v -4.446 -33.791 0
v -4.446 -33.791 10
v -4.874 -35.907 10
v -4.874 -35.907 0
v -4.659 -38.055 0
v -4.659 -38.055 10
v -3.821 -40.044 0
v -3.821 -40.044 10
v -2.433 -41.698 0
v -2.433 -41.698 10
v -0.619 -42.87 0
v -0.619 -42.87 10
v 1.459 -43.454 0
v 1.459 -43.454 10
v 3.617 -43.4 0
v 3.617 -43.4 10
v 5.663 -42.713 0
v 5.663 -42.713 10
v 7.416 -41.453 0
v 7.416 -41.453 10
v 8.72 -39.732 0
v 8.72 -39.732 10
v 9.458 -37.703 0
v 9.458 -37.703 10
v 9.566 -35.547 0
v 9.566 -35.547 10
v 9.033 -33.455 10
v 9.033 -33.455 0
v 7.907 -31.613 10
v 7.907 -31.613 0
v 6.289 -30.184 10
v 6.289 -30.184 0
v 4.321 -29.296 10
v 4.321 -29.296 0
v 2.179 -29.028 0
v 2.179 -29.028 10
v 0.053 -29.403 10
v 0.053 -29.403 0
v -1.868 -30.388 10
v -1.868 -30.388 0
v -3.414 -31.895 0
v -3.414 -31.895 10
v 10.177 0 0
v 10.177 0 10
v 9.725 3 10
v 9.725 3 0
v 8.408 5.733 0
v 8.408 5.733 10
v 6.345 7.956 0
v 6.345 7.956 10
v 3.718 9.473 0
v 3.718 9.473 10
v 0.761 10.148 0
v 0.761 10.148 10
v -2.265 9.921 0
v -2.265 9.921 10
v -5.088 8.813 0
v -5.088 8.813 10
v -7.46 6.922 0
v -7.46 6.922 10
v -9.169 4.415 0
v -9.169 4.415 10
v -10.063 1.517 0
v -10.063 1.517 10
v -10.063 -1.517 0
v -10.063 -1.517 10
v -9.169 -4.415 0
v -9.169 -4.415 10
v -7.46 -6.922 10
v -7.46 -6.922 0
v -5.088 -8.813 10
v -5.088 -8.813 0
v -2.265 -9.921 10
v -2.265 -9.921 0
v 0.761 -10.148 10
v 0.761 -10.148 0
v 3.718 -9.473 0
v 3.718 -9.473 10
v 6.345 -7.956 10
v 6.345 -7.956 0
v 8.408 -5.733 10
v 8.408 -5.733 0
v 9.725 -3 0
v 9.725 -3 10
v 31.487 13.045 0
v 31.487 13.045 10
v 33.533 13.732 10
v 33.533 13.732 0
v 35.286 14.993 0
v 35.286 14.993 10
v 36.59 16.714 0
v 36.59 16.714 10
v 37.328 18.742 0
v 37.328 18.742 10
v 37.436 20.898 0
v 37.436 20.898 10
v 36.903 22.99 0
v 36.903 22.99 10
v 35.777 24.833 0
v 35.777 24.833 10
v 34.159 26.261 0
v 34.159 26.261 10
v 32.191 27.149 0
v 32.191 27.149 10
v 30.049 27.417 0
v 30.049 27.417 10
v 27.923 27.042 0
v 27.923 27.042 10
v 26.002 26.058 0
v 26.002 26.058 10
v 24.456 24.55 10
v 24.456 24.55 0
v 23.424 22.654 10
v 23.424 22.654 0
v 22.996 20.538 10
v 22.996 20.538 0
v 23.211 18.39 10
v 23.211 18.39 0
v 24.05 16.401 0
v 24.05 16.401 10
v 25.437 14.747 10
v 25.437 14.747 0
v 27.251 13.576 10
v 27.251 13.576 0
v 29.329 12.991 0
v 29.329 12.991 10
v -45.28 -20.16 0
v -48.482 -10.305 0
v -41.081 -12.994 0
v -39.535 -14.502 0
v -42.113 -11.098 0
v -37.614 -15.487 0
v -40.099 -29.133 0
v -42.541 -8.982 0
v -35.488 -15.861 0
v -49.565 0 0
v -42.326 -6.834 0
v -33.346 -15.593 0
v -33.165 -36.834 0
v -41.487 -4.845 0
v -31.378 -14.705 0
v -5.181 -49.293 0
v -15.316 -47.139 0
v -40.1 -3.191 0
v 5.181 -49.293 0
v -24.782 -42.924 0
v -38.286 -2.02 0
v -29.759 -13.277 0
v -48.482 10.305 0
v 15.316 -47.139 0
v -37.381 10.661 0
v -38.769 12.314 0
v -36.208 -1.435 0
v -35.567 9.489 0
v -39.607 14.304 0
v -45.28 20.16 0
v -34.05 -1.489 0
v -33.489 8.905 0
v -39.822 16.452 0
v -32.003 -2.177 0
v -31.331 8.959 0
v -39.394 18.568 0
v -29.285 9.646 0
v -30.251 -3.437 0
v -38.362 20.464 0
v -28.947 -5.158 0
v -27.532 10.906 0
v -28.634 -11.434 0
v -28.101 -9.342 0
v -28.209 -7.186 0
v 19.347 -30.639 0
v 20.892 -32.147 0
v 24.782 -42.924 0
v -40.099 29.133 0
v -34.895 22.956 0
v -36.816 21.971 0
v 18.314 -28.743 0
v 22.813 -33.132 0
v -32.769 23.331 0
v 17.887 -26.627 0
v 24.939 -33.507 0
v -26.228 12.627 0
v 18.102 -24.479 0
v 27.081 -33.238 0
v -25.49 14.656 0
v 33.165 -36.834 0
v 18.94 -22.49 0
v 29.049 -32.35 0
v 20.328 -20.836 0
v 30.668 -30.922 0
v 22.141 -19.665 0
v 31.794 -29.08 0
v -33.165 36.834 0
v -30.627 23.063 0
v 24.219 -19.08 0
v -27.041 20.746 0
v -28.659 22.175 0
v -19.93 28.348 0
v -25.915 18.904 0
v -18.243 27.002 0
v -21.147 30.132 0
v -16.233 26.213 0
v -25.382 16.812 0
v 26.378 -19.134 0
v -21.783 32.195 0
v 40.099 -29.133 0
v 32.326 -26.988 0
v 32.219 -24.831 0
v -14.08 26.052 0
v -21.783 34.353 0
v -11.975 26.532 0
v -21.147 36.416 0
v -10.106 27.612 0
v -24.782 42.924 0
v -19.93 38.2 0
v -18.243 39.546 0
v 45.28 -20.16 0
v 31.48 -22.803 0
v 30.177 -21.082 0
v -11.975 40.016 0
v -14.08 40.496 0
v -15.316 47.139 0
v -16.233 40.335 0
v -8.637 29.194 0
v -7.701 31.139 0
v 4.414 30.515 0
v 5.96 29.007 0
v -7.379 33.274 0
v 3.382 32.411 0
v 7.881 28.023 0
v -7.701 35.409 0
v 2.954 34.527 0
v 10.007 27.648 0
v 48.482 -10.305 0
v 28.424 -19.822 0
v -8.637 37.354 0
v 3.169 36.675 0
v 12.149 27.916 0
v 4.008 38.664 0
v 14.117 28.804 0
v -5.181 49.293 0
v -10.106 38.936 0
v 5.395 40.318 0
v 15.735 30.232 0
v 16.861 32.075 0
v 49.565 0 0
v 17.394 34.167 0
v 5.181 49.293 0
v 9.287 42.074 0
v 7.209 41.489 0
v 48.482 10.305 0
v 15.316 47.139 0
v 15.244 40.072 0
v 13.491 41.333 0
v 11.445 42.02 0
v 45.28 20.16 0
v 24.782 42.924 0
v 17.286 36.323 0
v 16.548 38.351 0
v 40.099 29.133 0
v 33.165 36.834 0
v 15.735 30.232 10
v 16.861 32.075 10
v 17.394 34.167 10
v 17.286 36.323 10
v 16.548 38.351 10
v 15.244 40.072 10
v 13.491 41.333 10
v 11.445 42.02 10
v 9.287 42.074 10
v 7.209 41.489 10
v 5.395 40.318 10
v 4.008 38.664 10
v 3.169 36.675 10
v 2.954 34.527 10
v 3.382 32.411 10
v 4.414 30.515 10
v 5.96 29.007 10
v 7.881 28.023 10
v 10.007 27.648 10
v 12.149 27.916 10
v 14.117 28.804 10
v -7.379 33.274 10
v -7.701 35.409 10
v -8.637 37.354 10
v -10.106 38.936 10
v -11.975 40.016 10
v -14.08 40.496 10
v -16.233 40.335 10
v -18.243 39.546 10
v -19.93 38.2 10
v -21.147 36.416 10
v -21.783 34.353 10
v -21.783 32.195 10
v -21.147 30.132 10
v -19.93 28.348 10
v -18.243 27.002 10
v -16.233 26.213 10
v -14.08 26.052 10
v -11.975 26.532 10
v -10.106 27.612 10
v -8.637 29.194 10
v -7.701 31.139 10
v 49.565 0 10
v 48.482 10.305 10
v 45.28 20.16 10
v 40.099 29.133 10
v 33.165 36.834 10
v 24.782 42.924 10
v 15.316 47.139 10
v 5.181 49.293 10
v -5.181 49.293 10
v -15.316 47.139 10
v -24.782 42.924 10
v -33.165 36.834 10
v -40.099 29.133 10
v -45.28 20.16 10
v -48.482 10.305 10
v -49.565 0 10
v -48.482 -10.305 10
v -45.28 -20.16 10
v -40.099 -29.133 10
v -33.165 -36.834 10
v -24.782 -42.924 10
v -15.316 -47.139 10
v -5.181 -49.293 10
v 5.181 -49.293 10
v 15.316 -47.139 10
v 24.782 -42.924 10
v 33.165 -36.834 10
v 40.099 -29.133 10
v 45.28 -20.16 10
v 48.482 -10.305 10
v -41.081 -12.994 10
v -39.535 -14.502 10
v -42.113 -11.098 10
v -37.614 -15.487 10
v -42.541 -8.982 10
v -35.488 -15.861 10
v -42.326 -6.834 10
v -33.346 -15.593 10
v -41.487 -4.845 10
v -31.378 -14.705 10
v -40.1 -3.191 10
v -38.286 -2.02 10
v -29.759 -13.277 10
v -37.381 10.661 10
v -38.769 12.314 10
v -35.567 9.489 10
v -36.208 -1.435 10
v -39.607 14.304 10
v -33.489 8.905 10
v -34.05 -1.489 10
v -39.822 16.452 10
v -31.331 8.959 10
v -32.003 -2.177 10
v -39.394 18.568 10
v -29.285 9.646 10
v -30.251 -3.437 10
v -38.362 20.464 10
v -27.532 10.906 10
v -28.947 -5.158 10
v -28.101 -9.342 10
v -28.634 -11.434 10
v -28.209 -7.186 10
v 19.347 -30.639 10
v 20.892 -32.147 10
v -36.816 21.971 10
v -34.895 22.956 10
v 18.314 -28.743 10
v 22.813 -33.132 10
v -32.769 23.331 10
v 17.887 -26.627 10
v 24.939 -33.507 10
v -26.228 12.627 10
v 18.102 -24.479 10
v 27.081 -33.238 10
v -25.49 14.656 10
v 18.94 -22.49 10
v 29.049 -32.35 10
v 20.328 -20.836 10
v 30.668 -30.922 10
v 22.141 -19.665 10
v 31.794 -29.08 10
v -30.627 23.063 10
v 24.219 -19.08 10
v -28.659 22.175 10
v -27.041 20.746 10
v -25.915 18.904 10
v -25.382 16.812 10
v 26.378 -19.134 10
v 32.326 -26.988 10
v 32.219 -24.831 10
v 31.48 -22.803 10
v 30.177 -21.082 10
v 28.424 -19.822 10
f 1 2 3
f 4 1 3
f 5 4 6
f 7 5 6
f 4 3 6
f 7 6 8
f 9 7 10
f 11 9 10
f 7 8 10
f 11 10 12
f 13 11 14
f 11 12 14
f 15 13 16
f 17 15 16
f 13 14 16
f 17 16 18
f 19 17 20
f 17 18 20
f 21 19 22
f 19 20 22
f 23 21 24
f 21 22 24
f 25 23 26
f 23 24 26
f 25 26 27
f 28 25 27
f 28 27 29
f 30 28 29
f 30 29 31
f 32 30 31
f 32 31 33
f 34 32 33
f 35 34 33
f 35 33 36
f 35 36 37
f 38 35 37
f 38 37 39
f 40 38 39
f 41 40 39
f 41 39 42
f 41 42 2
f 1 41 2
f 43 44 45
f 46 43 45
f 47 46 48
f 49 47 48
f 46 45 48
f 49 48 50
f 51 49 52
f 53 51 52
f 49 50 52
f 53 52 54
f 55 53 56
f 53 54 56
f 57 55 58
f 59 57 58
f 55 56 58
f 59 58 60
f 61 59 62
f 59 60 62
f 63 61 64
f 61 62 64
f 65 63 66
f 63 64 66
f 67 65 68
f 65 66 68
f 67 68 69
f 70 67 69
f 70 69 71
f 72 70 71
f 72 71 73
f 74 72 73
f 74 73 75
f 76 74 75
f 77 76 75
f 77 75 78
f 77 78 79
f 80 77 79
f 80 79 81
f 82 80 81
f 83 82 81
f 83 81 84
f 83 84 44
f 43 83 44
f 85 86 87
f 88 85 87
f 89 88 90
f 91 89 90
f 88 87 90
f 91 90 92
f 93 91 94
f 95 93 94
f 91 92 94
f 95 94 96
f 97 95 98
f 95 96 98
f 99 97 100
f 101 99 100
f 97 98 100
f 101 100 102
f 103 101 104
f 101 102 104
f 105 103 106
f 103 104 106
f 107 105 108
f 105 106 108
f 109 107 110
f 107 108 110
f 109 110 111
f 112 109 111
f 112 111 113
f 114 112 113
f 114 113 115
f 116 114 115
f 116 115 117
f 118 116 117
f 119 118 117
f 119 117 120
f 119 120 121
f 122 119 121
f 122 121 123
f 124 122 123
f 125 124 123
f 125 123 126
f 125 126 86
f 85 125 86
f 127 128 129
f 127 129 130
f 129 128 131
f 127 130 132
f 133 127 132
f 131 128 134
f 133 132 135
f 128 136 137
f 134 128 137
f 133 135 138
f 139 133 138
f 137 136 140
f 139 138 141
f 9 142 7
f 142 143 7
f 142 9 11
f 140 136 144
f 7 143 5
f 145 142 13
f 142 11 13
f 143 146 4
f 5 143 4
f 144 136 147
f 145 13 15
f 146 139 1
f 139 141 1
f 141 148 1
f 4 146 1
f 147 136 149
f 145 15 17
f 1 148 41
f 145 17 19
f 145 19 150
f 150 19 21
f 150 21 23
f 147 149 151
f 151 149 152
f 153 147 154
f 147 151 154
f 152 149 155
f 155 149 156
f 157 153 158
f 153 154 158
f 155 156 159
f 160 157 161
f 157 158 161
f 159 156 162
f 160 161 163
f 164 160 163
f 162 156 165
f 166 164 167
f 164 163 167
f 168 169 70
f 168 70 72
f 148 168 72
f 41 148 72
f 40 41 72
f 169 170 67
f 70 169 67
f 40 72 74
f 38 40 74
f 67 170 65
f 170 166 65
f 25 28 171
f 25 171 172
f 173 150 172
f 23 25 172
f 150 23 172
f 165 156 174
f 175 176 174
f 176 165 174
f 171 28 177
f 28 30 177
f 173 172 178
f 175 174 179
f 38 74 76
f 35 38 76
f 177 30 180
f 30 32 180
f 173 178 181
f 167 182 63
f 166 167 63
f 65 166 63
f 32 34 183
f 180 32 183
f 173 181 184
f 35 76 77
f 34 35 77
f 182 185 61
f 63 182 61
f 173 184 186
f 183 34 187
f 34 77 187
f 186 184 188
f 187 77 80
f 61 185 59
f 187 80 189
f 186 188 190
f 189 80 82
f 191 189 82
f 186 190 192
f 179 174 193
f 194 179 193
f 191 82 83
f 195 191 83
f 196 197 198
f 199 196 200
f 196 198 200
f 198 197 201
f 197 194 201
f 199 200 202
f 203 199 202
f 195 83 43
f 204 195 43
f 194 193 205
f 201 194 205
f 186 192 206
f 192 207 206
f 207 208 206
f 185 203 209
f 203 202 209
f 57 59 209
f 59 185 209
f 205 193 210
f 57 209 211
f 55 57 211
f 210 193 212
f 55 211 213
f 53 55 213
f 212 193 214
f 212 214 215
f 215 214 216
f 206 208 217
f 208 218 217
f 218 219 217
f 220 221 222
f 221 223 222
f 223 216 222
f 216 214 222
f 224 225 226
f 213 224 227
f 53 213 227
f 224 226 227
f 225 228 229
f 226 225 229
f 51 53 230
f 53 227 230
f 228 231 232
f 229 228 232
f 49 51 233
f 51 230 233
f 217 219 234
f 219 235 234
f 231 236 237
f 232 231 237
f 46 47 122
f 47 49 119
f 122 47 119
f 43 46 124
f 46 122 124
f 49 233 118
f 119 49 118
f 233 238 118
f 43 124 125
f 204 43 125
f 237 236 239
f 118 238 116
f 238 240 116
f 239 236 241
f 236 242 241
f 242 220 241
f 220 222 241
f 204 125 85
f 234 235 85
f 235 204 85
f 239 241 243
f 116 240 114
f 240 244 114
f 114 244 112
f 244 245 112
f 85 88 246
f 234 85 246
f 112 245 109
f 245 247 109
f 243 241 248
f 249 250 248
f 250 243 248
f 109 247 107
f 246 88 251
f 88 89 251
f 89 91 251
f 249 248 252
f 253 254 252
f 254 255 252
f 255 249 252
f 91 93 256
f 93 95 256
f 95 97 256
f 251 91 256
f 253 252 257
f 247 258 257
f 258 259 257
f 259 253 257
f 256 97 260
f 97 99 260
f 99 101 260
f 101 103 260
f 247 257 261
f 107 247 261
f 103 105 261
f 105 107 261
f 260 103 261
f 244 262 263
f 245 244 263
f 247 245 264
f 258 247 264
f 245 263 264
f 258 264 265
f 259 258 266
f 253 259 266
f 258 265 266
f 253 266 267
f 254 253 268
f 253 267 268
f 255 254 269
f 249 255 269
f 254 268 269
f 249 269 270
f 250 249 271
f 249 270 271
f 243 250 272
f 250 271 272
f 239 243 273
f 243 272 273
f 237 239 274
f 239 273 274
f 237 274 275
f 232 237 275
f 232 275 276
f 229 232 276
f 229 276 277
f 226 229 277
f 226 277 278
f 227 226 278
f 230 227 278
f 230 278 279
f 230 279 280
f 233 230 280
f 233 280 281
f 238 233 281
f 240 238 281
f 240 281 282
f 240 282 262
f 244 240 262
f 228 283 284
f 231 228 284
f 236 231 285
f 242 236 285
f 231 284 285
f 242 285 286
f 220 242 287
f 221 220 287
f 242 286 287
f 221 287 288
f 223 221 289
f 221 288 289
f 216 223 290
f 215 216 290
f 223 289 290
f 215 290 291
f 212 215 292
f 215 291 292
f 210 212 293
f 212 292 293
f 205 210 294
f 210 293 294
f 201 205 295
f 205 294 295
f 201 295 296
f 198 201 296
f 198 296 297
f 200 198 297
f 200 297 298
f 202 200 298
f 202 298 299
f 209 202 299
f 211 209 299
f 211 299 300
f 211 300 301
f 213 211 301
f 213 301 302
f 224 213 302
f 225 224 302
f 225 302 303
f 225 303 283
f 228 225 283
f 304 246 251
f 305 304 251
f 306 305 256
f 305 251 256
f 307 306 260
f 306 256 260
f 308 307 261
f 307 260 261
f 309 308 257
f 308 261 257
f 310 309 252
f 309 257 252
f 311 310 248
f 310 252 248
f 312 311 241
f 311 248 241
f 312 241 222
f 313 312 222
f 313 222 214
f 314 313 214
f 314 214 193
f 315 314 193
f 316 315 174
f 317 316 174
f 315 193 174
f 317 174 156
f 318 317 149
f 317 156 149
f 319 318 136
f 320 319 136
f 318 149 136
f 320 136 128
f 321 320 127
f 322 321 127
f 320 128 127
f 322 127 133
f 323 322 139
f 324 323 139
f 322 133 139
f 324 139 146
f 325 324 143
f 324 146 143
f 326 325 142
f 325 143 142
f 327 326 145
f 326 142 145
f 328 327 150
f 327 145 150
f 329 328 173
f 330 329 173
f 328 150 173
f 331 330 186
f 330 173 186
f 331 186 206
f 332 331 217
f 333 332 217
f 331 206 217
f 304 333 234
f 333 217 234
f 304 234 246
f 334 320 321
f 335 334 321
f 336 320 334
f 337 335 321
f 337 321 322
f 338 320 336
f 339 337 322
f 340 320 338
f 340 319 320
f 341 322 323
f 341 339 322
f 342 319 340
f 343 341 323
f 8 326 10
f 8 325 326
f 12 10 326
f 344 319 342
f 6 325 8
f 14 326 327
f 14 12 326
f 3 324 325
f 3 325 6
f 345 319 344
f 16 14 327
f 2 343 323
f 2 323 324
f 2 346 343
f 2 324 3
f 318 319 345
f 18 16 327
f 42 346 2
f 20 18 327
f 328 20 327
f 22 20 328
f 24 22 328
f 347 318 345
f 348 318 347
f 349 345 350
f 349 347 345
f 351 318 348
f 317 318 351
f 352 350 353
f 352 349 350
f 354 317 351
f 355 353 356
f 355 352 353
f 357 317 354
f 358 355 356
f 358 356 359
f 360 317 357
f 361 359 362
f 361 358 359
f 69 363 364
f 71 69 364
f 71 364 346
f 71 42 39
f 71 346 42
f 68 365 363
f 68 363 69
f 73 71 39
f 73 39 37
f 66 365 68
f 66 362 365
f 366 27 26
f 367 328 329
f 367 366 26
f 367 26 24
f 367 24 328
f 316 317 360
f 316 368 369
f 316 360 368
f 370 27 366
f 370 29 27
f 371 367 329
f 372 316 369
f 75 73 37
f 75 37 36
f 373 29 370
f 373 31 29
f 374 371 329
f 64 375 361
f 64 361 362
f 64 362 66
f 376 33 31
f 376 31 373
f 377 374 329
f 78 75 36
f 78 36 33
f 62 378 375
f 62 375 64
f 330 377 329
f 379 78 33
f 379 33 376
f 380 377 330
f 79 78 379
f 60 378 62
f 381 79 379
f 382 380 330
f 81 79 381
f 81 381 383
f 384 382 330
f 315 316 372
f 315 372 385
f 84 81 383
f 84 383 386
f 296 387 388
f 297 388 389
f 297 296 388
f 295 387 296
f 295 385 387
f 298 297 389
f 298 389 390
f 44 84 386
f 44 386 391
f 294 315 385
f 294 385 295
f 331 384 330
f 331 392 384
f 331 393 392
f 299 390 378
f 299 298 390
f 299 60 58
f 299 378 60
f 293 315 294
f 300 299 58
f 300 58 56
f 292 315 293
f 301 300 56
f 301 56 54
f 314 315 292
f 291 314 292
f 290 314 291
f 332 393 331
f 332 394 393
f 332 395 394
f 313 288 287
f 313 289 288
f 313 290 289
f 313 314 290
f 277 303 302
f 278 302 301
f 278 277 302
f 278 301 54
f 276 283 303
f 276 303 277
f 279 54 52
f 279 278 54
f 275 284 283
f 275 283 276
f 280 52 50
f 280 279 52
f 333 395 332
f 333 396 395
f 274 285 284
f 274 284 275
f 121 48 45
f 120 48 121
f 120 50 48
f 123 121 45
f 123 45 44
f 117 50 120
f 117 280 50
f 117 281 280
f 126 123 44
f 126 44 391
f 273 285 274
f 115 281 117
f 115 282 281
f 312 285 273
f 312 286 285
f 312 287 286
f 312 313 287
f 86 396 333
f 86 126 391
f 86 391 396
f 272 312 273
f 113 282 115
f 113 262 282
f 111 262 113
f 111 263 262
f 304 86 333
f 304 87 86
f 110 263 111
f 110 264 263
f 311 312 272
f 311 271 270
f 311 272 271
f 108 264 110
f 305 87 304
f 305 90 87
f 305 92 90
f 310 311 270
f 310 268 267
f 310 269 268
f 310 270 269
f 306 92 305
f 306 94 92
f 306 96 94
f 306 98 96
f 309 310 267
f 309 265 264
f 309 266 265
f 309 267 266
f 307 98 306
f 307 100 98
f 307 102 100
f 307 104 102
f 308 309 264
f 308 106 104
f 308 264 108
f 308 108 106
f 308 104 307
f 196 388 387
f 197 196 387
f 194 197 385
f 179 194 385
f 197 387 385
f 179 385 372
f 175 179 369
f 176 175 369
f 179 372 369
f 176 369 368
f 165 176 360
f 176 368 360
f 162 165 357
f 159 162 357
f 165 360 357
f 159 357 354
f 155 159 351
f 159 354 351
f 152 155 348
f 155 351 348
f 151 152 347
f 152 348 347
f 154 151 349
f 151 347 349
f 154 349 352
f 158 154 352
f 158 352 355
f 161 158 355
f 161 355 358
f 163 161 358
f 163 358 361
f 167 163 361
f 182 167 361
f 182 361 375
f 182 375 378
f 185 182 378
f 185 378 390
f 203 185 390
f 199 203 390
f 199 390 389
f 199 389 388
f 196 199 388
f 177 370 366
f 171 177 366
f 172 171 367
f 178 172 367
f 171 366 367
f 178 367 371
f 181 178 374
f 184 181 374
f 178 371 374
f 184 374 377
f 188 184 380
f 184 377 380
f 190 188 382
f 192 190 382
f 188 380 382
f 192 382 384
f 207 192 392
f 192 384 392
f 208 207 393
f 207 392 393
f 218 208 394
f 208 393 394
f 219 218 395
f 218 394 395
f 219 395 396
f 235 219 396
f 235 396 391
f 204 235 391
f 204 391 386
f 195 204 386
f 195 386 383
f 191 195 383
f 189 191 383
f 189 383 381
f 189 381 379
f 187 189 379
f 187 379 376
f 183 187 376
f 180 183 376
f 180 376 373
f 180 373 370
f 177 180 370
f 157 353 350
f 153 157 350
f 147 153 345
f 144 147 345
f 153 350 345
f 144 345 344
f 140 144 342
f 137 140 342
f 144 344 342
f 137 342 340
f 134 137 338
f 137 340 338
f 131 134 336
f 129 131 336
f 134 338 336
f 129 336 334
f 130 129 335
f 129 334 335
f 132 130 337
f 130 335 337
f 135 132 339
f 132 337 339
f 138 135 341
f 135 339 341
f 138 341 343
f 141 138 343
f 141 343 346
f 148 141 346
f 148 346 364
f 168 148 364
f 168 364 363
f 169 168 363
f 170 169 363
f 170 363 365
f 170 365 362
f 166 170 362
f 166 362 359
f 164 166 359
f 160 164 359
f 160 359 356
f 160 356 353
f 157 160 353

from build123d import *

# Parameters (mm, degrees)
SKETCH8_R           = 49.56483005
BOSS_EXTRUDE3_DEPTH = 10
SKETCH9_R           = 10.176647679
CUT_EXTRUDE3_DEPTH  = 11
SKETCH11_R          = 7.242372995
CUT_EXTRUDE5_DEPTH  = 11
CIRPATTERN2_COUNT   = 9


with BuildPart() as part:
    # Sketch8 → Boss-Extrude3 (new body)
    with BuildSketch(Plane.XY):
        Circle(SKETCH8_R)
    extrude(amount=BOSS_EXTRUDE3_DEPTH)

    # Sketch9 → Cut-Extrude3 (cut, through all)
    with BuildSketch(Plane.XY.offset(10)):
        Circle(SKETCH9_R)
    extrude(amount=-CUT_EXTRUDE3_DEPTH, mode=Mode.SUBTRACT)

    # Sketch11 → Cut-Extrude5 (cut, through all)
    with BuildSketch(Plane.XY.offset(10)):
        with Locations((-14.621394537, 33.273921214)):
            Circle(SKETCH11_R)
    cut_extrude5 = extrude(amount=-CUT_EXTRUDE5_DEPTH, mode=Mode.SUBTRACT)

    # CirPattern2: Cut-Extrude5 ×9 about axis, 2 skipped
    cirpattern2_axis = Axis((0, 0, 0), (0, 0, 1))
    add([cut_extrude5.rotate(cirpattern2_axis, i * 360 / CIRPATTERN2_COUNT) for i in range(1, CIRPATTERN2_COUNT) if i not in (3, 6)], mode=Mode.SUBTRACT)


solid = part.part
